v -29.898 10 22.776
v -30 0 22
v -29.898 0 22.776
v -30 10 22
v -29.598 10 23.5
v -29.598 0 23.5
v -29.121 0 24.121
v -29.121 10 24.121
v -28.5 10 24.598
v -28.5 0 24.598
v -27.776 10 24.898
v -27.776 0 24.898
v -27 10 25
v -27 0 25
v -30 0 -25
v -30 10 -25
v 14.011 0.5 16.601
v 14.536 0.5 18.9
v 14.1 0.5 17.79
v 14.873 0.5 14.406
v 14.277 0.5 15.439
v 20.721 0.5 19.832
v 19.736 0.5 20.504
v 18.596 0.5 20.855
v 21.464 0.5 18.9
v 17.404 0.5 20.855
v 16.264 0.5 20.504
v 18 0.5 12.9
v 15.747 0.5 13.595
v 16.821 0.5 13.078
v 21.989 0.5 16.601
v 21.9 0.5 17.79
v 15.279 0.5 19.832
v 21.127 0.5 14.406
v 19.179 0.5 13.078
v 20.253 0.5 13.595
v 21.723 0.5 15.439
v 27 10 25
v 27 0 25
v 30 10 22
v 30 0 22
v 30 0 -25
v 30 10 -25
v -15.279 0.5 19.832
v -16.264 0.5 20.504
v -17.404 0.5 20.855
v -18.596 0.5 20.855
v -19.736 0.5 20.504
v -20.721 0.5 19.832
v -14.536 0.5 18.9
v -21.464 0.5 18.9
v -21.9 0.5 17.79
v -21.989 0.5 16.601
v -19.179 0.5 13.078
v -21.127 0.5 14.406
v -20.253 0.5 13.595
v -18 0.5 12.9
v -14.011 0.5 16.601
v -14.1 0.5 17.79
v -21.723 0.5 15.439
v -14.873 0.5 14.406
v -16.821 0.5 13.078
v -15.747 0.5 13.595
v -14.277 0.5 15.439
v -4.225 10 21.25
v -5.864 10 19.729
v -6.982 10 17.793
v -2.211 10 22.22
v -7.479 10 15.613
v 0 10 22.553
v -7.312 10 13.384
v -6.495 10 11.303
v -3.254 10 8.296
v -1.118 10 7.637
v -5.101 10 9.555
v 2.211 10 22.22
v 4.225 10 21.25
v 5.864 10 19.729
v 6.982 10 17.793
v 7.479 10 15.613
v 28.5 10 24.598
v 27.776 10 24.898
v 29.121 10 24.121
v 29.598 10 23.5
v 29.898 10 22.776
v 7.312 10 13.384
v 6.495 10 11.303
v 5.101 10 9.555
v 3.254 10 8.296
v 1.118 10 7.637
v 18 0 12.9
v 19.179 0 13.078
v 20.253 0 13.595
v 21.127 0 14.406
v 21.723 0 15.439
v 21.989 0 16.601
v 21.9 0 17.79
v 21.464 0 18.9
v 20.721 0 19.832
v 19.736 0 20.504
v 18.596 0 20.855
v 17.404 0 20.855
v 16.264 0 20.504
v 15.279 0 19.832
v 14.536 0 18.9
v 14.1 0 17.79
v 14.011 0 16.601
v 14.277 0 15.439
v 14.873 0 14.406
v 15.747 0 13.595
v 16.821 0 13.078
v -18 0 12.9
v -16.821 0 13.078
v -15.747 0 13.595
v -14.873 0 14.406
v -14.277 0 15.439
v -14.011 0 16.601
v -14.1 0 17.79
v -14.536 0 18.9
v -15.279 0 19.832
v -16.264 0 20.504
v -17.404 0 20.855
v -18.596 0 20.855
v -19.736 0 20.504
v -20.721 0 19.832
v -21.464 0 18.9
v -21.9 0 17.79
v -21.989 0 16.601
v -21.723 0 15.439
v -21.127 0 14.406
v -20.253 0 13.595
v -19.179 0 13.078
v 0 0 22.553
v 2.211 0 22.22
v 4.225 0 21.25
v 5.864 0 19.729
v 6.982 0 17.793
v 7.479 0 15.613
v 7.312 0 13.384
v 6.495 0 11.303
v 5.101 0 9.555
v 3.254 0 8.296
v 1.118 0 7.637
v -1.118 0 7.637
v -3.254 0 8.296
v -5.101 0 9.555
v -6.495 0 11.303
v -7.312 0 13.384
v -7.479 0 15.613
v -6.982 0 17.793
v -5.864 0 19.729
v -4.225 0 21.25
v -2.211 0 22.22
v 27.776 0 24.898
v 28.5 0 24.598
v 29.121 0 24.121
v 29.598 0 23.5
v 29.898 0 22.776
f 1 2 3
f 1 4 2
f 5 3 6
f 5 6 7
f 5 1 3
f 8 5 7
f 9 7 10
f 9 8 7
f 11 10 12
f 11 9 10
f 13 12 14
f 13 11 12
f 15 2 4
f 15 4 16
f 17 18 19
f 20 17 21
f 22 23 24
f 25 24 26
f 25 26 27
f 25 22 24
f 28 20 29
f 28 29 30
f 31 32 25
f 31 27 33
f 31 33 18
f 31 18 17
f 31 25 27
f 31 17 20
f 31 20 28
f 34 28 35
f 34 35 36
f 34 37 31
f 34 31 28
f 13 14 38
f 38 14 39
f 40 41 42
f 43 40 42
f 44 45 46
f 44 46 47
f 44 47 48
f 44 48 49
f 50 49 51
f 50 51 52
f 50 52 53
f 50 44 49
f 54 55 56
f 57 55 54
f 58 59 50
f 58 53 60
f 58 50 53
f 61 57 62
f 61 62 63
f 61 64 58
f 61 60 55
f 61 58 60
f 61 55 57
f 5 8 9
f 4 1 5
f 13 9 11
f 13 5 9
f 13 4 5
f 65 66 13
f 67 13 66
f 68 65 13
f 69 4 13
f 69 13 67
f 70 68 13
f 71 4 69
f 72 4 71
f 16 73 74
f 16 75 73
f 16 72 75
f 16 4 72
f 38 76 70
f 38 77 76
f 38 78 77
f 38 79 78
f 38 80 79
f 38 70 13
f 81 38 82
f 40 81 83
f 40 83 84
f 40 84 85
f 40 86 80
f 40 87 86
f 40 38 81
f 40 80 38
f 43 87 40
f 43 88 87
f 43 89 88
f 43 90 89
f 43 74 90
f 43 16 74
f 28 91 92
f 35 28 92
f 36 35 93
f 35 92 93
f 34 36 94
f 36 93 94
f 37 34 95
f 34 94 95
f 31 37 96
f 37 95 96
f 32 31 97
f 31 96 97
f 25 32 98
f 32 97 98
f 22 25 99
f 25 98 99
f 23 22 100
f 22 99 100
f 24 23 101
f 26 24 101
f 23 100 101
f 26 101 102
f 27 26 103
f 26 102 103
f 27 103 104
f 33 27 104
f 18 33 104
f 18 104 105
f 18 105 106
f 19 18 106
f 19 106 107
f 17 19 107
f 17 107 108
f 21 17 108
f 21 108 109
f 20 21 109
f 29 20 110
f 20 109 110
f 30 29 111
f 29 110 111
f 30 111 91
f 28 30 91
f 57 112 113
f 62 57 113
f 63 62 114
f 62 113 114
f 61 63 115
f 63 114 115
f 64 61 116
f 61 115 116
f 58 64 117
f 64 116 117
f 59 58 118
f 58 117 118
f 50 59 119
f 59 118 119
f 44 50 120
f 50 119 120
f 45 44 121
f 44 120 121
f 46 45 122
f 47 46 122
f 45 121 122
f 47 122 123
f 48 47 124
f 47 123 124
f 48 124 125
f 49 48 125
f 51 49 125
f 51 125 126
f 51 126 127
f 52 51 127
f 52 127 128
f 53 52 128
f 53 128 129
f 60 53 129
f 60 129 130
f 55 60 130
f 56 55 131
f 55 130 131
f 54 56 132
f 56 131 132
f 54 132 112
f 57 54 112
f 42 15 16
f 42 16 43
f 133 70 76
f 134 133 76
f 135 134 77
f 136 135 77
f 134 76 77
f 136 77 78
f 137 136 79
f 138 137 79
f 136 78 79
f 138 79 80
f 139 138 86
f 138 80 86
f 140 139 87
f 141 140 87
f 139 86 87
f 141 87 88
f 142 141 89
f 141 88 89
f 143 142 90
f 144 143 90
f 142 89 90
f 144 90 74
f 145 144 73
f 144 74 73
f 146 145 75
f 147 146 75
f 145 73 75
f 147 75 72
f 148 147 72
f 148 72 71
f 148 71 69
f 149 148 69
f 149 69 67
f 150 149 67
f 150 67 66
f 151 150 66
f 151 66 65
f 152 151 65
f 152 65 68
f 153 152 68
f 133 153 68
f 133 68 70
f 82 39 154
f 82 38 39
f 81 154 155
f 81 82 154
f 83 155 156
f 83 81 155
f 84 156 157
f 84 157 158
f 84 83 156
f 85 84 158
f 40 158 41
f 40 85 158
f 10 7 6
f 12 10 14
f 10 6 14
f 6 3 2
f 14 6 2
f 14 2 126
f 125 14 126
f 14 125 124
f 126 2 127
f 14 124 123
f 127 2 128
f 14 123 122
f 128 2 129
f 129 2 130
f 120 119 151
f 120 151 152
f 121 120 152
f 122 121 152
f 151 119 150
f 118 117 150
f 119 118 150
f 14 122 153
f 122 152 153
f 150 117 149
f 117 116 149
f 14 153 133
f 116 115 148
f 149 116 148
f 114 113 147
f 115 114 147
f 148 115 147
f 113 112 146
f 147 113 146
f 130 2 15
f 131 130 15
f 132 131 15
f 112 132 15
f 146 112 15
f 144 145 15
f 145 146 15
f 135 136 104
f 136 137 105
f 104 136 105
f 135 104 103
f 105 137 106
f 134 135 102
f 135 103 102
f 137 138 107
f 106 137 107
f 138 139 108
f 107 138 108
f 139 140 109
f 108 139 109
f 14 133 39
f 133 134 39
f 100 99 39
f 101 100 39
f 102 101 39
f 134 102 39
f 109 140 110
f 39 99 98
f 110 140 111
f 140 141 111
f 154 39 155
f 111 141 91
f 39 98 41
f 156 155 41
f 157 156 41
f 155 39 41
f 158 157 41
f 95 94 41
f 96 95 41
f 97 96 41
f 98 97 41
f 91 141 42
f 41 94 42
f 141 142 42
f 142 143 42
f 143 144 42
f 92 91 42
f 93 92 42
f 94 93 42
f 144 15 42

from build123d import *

# Parameters (mm, degrees)
SKETCH_1_W          = 60
SKETCH_1_H          = 50
EXTRUDE_1_DEPTH     = 10
SKETCH_2_R          = 4
CUT_EXTRUDE_1_DEPTH = 0.5
FILLET_1_R          = 3
SKETCH_3_R          = 7.5
CUT_EXTRUDE_2_DEPTH = 41.311288741


with BuildPart() as part:
    # 草图1 → 凸台-拉伸1 (new body)
    with BuildSketch(Plane(origin=(0, 0, 0), x_dir=(1, 0, 0), z_dir=(0, 1, 0))):
        Rectangle(SKETCH_1_W, SKETCH_1_H)
    extrude(amount=EXTRUDE_1_DEPTH)

    # 草图2 → 切除-拉伸1 (cut)
    with BuildSketch(Plane.XZ):
        with Locations(Location((-18, 16.9, 0), (0, 0, 270))):
            Circle(SKETCH_2_R)
        with Locations(Location((18, 16.9, 0), (0, 0, 270))):
            Circle(SKETCH_2_R)
    extrude(amount=-CUT_EXTRUDE_1_DEPTH, mode=Mode.SUBTRACT)

    # 圆角1
    fillet_1_edges = [part.edges().sort_by_distance(p)[0] for p in [
        (30, 5, 25),
        (-30, 5, 25),
    ]]
    fillet(fillet_1_edges, radius=FILLET_1_R)

    # 草图3 → 切除-拉伸2 (cut, through all)
    with BuildSketch(Plane(origin=(0, 10, 0), x_dir=(1, 0, 0), z_dir=(0, 1, 0))):
        with Locations(Location((0, -15.052922201, 0), (0, 0, 270))):
            Circle(SKETCH_3_R)
    extrude(amount=-CUT_EXTRUDE_2_DEPTH, mode=Mode.SUBTRACT)


solid = part.part
